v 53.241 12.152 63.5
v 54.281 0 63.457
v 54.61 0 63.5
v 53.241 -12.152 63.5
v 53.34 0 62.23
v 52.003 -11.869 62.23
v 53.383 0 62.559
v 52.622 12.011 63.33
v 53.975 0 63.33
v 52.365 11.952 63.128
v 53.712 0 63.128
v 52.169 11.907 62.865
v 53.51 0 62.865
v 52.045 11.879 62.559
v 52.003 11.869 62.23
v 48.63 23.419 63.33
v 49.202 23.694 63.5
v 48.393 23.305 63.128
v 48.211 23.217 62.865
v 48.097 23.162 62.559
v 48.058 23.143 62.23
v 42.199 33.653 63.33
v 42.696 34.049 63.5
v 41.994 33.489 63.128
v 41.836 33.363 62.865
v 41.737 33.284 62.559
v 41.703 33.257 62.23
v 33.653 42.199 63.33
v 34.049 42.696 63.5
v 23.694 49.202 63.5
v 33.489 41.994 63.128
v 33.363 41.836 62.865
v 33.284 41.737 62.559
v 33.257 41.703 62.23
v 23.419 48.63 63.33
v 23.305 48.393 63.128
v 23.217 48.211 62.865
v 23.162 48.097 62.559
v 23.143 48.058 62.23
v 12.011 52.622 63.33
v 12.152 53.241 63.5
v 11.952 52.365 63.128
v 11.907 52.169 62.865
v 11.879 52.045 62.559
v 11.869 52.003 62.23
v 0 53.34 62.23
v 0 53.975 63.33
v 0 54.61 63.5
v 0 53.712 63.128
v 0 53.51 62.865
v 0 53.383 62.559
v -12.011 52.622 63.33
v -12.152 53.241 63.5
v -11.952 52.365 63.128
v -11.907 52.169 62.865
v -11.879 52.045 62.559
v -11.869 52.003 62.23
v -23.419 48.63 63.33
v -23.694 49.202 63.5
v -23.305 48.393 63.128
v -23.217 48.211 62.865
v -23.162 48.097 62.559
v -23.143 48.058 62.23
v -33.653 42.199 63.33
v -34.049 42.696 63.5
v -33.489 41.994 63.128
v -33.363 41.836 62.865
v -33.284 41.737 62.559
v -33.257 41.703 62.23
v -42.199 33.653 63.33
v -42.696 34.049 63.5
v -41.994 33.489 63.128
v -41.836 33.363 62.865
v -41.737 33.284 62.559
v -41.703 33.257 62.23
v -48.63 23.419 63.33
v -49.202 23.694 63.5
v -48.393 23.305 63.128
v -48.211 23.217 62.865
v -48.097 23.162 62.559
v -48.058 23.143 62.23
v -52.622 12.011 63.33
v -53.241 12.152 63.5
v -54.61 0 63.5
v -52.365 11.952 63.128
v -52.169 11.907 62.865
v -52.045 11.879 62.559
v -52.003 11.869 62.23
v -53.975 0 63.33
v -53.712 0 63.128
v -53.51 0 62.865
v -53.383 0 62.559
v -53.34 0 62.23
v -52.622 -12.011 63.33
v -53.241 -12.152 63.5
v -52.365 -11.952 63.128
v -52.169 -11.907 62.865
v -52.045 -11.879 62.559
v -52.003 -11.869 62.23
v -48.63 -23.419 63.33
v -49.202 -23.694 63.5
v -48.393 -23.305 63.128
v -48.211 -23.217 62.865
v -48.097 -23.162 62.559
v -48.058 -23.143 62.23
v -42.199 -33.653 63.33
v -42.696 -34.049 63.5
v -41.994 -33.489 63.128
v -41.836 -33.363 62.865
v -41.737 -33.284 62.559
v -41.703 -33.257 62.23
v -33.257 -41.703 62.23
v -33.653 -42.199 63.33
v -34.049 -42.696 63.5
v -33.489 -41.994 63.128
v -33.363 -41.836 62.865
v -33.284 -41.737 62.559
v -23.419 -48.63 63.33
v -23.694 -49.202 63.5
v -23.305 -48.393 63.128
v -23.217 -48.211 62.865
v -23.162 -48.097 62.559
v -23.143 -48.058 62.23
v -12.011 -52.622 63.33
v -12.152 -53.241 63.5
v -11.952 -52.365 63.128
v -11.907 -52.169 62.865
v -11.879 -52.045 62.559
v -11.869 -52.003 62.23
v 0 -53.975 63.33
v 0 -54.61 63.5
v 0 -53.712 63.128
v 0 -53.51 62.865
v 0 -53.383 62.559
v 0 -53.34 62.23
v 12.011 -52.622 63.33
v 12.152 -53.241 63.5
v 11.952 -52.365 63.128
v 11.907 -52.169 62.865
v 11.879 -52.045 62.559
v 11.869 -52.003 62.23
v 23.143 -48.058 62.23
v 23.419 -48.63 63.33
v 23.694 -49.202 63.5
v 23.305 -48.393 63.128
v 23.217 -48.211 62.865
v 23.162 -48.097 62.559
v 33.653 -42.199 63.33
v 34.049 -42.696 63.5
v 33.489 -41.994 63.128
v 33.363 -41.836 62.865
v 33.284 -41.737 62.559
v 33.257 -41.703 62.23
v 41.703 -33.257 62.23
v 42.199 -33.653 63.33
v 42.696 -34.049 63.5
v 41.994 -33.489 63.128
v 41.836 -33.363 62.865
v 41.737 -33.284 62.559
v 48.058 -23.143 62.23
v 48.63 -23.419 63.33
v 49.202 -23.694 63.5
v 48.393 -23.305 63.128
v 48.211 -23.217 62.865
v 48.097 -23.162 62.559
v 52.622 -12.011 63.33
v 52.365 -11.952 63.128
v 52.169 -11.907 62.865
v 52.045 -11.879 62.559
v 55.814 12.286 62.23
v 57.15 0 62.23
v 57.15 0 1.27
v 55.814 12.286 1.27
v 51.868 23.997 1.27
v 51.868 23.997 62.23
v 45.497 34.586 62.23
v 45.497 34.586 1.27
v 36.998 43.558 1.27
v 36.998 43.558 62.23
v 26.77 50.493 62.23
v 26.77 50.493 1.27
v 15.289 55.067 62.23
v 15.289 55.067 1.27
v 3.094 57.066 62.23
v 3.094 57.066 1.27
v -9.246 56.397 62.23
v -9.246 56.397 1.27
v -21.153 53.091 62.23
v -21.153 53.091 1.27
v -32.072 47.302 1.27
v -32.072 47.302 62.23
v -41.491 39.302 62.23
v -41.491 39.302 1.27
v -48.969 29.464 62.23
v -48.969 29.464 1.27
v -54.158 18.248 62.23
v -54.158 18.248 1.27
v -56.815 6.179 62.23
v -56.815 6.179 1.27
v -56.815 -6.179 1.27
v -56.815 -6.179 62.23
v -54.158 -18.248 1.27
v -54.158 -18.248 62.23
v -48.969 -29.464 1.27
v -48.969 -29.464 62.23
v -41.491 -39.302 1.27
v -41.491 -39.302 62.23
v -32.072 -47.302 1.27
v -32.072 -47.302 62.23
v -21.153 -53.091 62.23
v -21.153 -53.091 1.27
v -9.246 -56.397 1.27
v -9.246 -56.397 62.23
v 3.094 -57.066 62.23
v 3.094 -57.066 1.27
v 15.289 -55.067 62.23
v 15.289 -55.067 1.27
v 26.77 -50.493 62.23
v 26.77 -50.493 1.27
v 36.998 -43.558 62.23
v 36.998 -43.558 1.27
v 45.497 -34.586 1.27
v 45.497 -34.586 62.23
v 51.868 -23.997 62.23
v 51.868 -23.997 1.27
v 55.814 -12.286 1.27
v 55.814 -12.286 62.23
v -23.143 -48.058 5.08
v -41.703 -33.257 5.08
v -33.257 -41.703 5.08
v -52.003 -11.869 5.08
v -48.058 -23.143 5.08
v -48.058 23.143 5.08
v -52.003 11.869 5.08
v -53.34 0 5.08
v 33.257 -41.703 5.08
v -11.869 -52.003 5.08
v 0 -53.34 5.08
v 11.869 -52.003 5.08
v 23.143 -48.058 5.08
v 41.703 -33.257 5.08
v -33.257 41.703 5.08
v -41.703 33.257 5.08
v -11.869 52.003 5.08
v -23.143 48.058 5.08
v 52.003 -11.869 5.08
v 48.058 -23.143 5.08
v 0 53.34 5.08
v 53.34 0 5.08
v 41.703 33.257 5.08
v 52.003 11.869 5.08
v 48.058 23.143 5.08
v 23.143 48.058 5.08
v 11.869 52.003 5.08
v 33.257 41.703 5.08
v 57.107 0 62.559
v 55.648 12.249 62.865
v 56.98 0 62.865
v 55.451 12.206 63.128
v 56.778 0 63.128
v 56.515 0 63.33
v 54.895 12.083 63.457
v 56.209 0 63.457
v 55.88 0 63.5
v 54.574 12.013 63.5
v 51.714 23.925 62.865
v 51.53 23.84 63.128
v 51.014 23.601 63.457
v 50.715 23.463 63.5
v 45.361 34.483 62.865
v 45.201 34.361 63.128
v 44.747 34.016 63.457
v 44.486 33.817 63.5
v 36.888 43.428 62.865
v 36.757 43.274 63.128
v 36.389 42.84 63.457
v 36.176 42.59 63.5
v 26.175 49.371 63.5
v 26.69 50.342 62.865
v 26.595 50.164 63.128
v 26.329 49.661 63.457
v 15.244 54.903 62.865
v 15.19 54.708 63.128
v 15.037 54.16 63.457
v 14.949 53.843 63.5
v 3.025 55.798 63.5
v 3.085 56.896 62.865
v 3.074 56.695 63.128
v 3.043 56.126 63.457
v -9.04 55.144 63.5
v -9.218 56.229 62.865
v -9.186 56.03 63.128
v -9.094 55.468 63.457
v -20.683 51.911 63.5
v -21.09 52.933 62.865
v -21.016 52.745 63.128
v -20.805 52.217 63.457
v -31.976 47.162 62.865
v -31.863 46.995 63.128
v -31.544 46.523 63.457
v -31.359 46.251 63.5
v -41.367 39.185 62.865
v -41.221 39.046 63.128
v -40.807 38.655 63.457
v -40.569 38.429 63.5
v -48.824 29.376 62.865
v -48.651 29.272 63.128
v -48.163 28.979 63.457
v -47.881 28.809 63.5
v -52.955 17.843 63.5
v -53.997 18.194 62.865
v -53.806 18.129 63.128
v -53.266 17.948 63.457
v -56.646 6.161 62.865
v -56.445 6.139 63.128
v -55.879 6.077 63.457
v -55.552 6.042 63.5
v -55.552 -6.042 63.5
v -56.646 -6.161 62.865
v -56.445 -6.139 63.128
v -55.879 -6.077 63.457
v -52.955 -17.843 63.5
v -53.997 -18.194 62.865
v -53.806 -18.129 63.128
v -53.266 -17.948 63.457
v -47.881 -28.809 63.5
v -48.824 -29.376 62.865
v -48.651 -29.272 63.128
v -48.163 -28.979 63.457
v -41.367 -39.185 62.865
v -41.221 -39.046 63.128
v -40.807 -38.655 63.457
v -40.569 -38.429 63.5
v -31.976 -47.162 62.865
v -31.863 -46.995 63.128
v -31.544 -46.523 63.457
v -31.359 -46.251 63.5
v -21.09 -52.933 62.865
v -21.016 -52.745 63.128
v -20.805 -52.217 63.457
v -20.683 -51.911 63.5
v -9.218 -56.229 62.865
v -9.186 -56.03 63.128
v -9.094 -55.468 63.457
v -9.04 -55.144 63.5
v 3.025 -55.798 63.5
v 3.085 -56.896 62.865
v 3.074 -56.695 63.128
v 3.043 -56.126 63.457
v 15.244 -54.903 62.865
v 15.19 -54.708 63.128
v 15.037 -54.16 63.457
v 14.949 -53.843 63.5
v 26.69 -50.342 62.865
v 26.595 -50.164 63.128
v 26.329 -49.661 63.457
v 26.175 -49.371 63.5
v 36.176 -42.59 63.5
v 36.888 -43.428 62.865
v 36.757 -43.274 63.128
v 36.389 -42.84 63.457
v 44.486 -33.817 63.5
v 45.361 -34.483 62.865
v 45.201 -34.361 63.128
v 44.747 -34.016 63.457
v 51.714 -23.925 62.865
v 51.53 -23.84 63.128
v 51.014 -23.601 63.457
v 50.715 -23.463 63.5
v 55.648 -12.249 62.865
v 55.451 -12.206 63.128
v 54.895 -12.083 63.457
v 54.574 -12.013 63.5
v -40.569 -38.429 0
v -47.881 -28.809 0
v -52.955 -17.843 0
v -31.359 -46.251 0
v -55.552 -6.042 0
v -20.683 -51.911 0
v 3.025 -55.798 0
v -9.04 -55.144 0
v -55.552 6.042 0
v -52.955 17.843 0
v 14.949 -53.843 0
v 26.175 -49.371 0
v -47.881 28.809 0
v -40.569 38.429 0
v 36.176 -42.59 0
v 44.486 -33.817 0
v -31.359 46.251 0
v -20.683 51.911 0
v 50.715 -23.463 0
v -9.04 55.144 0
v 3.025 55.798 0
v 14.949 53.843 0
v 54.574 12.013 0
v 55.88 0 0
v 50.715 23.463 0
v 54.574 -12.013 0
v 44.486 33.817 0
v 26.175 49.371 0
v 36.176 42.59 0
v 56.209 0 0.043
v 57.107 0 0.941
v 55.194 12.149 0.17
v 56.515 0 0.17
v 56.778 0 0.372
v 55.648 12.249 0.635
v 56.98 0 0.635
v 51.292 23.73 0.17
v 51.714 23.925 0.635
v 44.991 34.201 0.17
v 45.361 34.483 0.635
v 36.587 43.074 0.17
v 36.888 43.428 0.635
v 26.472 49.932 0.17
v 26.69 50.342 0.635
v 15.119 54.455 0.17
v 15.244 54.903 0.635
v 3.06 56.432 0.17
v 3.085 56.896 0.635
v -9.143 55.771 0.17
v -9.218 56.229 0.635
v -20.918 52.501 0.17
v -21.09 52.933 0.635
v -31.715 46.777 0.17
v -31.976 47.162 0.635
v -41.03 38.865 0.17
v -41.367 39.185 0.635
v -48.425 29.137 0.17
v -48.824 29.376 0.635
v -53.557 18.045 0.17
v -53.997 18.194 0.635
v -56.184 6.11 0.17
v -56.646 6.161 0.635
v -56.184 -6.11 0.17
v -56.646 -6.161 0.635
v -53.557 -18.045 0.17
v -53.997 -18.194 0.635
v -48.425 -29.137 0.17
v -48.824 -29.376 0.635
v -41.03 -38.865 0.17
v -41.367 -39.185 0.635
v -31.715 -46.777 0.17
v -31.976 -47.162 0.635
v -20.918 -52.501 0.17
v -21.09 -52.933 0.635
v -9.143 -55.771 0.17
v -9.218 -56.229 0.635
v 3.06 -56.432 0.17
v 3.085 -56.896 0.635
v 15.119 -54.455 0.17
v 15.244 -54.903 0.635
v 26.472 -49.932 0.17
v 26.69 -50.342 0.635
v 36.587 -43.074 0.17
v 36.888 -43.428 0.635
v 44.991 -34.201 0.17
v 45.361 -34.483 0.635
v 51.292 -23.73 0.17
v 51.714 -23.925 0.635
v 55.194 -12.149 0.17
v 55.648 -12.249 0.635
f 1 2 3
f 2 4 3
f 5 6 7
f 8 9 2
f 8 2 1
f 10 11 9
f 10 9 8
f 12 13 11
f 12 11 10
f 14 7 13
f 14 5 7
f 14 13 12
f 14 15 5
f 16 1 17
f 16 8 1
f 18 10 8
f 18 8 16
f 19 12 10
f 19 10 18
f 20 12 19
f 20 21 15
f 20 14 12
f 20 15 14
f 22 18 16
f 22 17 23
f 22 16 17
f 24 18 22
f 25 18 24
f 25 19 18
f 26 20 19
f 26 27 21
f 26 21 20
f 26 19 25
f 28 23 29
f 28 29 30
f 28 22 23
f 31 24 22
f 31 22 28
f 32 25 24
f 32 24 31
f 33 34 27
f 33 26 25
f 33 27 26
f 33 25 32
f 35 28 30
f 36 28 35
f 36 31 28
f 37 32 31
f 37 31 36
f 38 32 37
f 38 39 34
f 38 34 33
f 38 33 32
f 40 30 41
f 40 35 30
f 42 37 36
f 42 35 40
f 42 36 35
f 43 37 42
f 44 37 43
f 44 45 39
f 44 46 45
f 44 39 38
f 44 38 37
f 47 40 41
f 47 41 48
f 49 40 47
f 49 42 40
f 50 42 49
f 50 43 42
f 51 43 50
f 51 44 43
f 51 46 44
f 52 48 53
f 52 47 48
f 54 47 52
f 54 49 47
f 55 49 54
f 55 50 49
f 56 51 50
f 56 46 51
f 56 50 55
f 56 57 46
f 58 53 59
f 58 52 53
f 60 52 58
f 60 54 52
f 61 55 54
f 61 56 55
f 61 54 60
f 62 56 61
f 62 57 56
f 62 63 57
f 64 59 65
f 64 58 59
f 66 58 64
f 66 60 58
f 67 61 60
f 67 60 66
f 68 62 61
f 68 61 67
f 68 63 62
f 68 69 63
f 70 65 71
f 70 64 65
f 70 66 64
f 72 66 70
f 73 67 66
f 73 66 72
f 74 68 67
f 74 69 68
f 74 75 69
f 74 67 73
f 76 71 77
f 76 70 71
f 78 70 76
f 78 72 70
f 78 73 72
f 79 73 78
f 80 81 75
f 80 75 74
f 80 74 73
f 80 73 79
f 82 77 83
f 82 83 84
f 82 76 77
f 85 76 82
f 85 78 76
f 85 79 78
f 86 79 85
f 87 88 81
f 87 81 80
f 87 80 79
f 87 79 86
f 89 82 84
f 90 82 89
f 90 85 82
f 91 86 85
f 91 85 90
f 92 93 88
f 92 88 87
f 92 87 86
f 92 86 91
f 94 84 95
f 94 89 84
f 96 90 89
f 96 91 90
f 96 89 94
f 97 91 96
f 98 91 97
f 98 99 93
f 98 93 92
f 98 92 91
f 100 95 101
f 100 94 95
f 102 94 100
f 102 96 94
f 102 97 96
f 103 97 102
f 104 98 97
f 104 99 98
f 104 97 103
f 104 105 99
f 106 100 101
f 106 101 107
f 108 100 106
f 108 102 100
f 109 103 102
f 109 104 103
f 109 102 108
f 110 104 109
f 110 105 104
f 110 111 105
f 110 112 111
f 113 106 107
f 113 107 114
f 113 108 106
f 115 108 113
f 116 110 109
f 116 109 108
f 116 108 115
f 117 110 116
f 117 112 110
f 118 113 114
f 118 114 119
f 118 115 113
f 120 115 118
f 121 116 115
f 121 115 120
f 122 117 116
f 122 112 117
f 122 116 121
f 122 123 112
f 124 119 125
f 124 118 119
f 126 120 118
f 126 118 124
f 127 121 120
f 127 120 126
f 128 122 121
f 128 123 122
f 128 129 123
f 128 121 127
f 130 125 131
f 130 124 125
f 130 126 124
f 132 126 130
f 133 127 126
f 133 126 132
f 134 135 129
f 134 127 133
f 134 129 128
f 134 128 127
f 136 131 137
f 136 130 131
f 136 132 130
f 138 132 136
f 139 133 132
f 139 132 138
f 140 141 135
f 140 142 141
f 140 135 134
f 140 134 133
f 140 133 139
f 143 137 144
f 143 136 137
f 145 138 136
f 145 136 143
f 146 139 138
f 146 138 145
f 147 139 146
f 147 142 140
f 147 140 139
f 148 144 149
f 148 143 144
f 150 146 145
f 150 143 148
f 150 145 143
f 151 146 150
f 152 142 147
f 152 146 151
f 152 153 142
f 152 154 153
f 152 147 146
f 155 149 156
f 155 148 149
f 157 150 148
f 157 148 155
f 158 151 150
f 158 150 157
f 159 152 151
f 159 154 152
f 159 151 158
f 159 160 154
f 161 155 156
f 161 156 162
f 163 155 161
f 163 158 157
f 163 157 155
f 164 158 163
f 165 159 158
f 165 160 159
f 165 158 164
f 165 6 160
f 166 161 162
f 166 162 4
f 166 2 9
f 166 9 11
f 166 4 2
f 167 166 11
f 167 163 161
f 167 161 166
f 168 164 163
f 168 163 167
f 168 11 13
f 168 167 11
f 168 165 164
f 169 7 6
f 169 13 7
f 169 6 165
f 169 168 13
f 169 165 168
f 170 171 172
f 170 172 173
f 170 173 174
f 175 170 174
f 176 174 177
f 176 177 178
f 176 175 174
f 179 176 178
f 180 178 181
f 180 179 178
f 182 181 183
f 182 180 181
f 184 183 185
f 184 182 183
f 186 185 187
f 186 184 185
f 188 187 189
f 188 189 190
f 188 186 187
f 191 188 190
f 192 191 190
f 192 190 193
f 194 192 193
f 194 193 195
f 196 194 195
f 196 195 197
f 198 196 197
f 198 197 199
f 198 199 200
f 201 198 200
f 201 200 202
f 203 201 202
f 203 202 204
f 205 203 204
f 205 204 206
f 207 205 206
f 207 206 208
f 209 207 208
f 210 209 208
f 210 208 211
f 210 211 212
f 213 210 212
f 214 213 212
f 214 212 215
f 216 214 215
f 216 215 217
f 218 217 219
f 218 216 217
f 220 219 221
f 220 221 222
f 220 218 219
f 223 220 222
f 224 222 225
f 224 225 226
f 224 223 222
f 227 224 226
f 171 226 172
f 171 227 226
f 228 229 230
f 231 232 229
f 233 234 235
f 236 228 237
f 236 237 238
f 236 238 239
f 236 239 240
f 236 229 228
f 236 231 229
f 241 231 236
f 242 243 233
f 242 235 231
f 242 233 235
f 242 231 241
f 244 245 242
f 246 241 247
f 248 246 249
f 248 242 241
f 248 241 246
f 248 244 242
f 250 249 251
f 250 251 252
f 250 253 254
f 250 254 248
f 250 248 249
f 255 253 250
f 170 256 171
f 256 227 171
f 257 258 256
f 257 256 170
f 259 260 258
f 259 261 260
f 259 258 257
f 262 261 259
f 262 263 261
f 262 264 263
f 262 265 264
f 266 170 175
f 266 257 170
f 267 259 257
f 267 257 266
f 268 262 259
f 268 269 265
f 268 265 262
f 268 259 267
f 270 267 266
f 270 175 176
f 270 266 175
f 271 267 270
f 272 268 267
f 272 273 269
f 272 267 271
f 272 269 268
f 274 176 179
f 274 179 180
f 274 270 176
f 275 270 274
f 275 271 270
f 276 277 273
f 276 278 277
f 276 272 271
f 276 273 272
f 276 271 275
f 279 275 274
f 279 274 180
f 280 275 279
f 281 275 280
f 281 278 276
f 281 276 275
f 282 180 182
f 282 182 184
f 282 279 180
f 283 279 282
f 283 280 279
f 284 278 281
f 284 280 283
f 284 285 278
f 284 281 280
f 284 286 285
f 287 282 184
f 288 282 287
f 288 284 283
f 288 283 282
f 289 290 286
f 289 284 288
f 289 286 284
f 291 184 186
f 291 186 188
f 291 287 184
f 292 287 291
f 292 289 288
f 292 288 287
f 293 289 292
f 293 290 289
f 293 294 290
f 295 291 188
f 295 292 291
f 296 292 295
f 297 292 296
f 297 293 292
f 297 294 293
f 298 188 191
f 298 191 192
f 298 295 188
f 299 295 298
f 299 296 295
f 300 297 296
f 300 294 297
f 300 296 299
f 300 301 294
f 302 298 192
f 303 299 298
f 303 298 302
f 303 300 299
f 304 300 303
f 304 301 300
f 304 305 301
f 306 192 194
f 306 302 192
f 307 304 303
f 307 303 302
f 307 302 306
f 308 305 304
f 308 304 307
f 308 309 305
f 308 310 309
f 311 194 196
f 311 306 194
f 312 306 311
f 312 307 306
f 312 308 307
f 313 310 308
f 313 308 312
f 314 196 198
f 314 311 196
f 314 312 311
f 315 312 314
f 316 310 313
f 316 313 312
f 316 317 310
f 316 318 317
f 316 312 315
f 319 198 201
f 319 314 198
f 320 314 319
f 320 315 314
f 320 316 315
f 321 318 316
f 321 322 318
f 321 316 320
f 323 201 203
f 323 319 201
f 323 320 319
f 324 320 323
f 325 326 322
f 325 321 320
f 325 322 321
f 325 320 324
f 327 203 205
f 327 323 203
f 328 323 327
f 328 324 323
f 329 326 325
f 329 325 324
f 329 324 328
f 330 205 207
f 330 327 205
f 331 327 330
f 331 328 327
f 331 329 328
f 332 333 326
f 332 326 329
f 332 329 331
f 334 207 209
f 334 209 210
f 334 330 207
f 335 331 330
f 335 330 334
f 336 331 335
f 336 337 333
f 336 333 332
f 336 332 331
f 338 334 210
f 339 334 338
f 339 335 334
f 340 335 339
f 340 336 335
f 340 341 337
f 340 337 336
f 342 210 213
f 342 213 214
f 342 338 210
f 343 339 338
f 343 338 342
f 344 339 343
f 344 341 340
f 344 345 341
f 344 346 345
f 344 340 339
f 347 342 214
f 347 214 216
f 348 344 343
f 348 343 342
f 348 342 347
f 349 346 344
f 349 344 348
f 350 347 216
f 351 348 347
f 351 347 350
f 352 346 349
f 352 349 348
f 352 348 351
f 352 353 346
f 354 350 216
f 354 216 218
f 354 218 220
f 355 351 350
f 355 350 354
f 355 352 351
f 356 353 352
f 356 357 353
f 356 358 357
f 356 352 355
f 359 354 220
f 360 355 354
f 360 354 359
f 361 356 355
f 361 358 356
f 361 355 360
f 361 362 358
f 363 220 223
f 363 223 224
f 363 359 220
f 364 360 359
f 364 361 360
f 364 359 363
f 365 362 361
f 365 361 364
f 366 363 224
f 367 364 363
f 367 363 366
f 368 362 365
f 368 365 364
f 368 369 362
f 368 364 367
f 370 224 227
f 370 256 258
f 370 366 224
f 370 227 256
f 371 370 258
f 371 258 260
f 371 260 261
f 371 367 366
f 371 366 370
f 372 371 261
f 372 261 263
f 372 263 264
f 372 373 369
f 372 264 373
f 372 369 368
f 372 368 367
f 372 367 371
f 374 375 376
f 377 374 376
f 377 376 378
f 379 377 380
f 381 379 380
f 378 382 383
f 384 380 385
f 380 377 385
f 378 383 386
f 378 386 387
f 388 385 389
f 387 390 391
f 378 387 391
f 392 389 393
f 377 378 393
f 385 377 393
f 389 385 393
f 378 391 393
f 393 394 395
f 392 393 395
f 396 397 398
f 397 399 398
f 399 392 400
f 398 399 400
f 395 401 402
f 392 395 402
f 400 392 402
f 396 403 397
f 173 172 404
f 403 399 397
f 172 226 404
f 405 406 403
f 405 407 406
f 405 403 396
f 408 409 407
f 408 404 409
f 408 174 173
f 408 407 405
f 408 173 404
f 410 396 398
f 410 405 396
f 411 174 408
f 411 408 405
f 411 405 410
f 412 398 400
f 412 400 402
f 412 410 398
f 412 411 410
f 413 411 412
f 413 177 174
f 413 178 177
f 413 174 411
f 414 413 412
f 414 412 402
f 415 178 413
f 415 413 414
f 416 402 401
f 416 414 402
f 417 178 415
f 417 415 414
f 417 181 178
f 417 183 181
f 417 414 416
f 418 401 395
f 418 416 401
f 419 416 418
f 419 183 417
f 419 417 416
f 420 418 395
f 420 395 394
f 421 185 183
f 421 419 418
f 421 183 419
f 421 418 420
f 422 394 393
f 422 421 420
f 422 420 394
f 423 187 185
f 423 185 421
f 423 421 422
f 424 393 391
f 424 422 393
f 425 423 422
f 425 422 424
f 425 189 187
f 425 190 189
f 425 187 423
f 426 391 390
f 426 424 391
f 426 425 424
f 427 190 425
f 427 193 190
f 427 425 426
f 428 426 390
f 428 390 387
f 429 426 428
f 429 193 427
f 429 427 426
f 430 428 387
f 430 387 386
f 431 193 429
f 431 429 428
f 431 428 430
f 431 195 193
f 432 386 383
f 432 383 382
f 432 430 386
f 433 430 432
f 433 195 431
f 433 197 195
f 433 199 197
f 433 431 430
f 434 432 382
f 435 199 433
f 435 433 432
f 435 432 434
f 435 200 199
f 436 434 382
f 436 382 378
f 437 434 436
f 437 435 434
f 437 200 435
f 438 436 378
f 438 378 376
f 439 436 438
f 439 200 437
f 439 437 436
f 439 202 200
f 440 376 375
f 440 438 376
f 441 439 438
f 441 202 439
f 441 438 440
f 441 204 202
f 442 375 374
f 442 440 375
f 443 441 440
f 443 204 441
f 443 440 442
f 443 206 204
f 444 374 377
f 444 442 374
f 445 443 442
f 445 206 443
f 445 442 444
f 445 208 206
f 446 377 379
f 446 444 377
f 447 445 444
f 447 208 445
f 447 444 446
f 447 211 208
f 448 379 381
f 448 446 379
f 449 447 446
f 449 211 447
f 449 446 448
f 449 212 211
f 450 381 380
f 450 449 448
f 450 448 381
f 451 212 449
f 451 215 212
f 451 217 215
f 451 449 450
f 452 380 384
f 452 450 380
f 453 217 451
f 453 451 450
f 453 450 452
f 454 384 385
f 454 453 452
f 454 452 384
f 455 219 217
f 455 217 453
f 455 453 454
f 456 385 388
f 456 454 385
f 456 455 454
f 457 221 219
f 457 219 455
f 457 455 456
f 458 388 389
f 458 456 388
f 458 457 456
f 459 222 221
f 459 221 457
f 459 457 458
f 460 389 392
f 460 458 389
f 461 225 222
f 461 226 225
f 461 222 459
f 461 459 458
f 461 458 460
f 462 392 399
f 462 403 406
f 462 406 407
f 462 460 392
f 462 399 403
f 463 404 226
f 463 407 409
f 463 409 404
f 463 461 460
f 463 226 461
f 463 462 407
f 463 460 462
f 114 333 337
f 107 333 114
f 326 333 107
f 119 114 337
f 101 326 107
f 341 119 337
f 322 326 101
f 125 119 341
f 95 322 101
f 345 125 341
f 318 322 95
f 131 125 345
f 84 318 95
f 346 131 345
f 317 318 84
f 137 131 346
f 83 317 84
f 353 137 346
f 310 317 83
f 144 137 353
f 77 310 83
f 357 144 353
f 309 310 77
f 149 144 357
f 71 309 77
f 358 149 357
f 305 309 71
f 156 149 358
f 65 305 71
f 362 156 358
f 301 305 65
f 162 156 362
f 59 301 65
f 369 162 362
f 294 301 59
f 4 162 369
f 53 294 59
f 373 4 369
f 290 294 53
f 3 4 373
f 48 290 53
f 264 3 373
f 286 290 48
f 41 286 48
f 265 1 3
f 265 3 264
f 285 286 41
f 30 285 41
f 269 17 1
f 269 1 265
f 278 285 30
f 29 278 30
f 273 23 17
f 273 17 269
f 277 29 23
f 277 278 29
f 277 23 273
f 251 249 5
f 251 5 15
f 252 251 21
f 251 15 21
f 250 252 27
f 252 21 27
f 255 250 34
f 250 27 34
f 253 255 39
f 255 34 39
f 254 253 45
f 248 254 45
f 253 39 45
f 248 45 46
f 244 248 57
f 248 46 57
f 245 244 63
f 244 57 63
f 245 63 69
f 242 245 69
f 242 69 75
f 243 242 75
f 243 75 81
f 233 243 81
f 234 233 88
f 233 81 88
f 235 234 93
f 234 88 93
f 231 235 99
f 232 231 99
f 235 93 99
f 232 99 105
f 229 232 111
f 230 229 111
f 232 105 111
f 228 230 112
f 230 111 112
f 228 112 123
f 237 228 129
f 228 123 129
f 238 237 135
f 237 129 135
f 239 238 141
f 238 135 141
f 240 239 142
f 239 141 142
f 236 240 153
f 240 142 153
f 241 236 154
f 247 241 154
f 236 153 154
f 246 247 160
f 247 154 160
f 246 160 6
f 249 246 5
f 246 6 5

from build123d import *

# Parameters (mm, degrees)
F0_R     = 57.15
F1_DEPTH = 5.08
F2_R     = 1.27
F5_E1_W  = 63.5
F5_E1_H  = 3.81
F7_R     = 1.26999
F8_R     = 1.27


# Not quite as in the source:
# - a fillet or chamfer is up to 0.001 mm smaller than in the source, because OpenCascade refuses the exact size


with BuildPart() as f1:
    # F0 (on Top) → F1 (new body)
    with BuildSketch(Plane.XY):
        Circle(F0_R)
    extrude(amount=F1_DEPTH)

    # F2
    f2_edges = [f1.edges().sort_by_distance(p)[0] for p in [
        (-57.15, 0, 0),
    ]]
    fillet(f2_edges, radius=F2_R)

    # F5_E1 (on explicit) → F6 (revolve)
    with BuildSketch(Plane(origin=(57.15, 0, 0), x_dir=(0, 0, 1), z_dir=(0, -1, 0))):
        with Locations((31.75, 1.905)):
            Rectangle(F5_E1_W, F5_E1_H)
    revolve(axis=Axis((0, 0, 5.08), (0, 0, 1)))

    # F7 (radius 1.27 in the source; OpenCascade refuses exactly that, so slightly less here)
    f7_edges = [f1.edges().sort_by_distance(p)[0] for p in [
        (-57.15, 0, 0),
    ]]
    fillet(f7_edges, radius=F7_R)

    # F8
    f8_edges = [f1.edges().sort_by_distance(p)[0] for p in [
        (-57.15, 0, 63.5),
        (-53.34, 0, 63.5),
    ]]
    fillet(f8_edges, radius=F8_R)


solid = f1.part
